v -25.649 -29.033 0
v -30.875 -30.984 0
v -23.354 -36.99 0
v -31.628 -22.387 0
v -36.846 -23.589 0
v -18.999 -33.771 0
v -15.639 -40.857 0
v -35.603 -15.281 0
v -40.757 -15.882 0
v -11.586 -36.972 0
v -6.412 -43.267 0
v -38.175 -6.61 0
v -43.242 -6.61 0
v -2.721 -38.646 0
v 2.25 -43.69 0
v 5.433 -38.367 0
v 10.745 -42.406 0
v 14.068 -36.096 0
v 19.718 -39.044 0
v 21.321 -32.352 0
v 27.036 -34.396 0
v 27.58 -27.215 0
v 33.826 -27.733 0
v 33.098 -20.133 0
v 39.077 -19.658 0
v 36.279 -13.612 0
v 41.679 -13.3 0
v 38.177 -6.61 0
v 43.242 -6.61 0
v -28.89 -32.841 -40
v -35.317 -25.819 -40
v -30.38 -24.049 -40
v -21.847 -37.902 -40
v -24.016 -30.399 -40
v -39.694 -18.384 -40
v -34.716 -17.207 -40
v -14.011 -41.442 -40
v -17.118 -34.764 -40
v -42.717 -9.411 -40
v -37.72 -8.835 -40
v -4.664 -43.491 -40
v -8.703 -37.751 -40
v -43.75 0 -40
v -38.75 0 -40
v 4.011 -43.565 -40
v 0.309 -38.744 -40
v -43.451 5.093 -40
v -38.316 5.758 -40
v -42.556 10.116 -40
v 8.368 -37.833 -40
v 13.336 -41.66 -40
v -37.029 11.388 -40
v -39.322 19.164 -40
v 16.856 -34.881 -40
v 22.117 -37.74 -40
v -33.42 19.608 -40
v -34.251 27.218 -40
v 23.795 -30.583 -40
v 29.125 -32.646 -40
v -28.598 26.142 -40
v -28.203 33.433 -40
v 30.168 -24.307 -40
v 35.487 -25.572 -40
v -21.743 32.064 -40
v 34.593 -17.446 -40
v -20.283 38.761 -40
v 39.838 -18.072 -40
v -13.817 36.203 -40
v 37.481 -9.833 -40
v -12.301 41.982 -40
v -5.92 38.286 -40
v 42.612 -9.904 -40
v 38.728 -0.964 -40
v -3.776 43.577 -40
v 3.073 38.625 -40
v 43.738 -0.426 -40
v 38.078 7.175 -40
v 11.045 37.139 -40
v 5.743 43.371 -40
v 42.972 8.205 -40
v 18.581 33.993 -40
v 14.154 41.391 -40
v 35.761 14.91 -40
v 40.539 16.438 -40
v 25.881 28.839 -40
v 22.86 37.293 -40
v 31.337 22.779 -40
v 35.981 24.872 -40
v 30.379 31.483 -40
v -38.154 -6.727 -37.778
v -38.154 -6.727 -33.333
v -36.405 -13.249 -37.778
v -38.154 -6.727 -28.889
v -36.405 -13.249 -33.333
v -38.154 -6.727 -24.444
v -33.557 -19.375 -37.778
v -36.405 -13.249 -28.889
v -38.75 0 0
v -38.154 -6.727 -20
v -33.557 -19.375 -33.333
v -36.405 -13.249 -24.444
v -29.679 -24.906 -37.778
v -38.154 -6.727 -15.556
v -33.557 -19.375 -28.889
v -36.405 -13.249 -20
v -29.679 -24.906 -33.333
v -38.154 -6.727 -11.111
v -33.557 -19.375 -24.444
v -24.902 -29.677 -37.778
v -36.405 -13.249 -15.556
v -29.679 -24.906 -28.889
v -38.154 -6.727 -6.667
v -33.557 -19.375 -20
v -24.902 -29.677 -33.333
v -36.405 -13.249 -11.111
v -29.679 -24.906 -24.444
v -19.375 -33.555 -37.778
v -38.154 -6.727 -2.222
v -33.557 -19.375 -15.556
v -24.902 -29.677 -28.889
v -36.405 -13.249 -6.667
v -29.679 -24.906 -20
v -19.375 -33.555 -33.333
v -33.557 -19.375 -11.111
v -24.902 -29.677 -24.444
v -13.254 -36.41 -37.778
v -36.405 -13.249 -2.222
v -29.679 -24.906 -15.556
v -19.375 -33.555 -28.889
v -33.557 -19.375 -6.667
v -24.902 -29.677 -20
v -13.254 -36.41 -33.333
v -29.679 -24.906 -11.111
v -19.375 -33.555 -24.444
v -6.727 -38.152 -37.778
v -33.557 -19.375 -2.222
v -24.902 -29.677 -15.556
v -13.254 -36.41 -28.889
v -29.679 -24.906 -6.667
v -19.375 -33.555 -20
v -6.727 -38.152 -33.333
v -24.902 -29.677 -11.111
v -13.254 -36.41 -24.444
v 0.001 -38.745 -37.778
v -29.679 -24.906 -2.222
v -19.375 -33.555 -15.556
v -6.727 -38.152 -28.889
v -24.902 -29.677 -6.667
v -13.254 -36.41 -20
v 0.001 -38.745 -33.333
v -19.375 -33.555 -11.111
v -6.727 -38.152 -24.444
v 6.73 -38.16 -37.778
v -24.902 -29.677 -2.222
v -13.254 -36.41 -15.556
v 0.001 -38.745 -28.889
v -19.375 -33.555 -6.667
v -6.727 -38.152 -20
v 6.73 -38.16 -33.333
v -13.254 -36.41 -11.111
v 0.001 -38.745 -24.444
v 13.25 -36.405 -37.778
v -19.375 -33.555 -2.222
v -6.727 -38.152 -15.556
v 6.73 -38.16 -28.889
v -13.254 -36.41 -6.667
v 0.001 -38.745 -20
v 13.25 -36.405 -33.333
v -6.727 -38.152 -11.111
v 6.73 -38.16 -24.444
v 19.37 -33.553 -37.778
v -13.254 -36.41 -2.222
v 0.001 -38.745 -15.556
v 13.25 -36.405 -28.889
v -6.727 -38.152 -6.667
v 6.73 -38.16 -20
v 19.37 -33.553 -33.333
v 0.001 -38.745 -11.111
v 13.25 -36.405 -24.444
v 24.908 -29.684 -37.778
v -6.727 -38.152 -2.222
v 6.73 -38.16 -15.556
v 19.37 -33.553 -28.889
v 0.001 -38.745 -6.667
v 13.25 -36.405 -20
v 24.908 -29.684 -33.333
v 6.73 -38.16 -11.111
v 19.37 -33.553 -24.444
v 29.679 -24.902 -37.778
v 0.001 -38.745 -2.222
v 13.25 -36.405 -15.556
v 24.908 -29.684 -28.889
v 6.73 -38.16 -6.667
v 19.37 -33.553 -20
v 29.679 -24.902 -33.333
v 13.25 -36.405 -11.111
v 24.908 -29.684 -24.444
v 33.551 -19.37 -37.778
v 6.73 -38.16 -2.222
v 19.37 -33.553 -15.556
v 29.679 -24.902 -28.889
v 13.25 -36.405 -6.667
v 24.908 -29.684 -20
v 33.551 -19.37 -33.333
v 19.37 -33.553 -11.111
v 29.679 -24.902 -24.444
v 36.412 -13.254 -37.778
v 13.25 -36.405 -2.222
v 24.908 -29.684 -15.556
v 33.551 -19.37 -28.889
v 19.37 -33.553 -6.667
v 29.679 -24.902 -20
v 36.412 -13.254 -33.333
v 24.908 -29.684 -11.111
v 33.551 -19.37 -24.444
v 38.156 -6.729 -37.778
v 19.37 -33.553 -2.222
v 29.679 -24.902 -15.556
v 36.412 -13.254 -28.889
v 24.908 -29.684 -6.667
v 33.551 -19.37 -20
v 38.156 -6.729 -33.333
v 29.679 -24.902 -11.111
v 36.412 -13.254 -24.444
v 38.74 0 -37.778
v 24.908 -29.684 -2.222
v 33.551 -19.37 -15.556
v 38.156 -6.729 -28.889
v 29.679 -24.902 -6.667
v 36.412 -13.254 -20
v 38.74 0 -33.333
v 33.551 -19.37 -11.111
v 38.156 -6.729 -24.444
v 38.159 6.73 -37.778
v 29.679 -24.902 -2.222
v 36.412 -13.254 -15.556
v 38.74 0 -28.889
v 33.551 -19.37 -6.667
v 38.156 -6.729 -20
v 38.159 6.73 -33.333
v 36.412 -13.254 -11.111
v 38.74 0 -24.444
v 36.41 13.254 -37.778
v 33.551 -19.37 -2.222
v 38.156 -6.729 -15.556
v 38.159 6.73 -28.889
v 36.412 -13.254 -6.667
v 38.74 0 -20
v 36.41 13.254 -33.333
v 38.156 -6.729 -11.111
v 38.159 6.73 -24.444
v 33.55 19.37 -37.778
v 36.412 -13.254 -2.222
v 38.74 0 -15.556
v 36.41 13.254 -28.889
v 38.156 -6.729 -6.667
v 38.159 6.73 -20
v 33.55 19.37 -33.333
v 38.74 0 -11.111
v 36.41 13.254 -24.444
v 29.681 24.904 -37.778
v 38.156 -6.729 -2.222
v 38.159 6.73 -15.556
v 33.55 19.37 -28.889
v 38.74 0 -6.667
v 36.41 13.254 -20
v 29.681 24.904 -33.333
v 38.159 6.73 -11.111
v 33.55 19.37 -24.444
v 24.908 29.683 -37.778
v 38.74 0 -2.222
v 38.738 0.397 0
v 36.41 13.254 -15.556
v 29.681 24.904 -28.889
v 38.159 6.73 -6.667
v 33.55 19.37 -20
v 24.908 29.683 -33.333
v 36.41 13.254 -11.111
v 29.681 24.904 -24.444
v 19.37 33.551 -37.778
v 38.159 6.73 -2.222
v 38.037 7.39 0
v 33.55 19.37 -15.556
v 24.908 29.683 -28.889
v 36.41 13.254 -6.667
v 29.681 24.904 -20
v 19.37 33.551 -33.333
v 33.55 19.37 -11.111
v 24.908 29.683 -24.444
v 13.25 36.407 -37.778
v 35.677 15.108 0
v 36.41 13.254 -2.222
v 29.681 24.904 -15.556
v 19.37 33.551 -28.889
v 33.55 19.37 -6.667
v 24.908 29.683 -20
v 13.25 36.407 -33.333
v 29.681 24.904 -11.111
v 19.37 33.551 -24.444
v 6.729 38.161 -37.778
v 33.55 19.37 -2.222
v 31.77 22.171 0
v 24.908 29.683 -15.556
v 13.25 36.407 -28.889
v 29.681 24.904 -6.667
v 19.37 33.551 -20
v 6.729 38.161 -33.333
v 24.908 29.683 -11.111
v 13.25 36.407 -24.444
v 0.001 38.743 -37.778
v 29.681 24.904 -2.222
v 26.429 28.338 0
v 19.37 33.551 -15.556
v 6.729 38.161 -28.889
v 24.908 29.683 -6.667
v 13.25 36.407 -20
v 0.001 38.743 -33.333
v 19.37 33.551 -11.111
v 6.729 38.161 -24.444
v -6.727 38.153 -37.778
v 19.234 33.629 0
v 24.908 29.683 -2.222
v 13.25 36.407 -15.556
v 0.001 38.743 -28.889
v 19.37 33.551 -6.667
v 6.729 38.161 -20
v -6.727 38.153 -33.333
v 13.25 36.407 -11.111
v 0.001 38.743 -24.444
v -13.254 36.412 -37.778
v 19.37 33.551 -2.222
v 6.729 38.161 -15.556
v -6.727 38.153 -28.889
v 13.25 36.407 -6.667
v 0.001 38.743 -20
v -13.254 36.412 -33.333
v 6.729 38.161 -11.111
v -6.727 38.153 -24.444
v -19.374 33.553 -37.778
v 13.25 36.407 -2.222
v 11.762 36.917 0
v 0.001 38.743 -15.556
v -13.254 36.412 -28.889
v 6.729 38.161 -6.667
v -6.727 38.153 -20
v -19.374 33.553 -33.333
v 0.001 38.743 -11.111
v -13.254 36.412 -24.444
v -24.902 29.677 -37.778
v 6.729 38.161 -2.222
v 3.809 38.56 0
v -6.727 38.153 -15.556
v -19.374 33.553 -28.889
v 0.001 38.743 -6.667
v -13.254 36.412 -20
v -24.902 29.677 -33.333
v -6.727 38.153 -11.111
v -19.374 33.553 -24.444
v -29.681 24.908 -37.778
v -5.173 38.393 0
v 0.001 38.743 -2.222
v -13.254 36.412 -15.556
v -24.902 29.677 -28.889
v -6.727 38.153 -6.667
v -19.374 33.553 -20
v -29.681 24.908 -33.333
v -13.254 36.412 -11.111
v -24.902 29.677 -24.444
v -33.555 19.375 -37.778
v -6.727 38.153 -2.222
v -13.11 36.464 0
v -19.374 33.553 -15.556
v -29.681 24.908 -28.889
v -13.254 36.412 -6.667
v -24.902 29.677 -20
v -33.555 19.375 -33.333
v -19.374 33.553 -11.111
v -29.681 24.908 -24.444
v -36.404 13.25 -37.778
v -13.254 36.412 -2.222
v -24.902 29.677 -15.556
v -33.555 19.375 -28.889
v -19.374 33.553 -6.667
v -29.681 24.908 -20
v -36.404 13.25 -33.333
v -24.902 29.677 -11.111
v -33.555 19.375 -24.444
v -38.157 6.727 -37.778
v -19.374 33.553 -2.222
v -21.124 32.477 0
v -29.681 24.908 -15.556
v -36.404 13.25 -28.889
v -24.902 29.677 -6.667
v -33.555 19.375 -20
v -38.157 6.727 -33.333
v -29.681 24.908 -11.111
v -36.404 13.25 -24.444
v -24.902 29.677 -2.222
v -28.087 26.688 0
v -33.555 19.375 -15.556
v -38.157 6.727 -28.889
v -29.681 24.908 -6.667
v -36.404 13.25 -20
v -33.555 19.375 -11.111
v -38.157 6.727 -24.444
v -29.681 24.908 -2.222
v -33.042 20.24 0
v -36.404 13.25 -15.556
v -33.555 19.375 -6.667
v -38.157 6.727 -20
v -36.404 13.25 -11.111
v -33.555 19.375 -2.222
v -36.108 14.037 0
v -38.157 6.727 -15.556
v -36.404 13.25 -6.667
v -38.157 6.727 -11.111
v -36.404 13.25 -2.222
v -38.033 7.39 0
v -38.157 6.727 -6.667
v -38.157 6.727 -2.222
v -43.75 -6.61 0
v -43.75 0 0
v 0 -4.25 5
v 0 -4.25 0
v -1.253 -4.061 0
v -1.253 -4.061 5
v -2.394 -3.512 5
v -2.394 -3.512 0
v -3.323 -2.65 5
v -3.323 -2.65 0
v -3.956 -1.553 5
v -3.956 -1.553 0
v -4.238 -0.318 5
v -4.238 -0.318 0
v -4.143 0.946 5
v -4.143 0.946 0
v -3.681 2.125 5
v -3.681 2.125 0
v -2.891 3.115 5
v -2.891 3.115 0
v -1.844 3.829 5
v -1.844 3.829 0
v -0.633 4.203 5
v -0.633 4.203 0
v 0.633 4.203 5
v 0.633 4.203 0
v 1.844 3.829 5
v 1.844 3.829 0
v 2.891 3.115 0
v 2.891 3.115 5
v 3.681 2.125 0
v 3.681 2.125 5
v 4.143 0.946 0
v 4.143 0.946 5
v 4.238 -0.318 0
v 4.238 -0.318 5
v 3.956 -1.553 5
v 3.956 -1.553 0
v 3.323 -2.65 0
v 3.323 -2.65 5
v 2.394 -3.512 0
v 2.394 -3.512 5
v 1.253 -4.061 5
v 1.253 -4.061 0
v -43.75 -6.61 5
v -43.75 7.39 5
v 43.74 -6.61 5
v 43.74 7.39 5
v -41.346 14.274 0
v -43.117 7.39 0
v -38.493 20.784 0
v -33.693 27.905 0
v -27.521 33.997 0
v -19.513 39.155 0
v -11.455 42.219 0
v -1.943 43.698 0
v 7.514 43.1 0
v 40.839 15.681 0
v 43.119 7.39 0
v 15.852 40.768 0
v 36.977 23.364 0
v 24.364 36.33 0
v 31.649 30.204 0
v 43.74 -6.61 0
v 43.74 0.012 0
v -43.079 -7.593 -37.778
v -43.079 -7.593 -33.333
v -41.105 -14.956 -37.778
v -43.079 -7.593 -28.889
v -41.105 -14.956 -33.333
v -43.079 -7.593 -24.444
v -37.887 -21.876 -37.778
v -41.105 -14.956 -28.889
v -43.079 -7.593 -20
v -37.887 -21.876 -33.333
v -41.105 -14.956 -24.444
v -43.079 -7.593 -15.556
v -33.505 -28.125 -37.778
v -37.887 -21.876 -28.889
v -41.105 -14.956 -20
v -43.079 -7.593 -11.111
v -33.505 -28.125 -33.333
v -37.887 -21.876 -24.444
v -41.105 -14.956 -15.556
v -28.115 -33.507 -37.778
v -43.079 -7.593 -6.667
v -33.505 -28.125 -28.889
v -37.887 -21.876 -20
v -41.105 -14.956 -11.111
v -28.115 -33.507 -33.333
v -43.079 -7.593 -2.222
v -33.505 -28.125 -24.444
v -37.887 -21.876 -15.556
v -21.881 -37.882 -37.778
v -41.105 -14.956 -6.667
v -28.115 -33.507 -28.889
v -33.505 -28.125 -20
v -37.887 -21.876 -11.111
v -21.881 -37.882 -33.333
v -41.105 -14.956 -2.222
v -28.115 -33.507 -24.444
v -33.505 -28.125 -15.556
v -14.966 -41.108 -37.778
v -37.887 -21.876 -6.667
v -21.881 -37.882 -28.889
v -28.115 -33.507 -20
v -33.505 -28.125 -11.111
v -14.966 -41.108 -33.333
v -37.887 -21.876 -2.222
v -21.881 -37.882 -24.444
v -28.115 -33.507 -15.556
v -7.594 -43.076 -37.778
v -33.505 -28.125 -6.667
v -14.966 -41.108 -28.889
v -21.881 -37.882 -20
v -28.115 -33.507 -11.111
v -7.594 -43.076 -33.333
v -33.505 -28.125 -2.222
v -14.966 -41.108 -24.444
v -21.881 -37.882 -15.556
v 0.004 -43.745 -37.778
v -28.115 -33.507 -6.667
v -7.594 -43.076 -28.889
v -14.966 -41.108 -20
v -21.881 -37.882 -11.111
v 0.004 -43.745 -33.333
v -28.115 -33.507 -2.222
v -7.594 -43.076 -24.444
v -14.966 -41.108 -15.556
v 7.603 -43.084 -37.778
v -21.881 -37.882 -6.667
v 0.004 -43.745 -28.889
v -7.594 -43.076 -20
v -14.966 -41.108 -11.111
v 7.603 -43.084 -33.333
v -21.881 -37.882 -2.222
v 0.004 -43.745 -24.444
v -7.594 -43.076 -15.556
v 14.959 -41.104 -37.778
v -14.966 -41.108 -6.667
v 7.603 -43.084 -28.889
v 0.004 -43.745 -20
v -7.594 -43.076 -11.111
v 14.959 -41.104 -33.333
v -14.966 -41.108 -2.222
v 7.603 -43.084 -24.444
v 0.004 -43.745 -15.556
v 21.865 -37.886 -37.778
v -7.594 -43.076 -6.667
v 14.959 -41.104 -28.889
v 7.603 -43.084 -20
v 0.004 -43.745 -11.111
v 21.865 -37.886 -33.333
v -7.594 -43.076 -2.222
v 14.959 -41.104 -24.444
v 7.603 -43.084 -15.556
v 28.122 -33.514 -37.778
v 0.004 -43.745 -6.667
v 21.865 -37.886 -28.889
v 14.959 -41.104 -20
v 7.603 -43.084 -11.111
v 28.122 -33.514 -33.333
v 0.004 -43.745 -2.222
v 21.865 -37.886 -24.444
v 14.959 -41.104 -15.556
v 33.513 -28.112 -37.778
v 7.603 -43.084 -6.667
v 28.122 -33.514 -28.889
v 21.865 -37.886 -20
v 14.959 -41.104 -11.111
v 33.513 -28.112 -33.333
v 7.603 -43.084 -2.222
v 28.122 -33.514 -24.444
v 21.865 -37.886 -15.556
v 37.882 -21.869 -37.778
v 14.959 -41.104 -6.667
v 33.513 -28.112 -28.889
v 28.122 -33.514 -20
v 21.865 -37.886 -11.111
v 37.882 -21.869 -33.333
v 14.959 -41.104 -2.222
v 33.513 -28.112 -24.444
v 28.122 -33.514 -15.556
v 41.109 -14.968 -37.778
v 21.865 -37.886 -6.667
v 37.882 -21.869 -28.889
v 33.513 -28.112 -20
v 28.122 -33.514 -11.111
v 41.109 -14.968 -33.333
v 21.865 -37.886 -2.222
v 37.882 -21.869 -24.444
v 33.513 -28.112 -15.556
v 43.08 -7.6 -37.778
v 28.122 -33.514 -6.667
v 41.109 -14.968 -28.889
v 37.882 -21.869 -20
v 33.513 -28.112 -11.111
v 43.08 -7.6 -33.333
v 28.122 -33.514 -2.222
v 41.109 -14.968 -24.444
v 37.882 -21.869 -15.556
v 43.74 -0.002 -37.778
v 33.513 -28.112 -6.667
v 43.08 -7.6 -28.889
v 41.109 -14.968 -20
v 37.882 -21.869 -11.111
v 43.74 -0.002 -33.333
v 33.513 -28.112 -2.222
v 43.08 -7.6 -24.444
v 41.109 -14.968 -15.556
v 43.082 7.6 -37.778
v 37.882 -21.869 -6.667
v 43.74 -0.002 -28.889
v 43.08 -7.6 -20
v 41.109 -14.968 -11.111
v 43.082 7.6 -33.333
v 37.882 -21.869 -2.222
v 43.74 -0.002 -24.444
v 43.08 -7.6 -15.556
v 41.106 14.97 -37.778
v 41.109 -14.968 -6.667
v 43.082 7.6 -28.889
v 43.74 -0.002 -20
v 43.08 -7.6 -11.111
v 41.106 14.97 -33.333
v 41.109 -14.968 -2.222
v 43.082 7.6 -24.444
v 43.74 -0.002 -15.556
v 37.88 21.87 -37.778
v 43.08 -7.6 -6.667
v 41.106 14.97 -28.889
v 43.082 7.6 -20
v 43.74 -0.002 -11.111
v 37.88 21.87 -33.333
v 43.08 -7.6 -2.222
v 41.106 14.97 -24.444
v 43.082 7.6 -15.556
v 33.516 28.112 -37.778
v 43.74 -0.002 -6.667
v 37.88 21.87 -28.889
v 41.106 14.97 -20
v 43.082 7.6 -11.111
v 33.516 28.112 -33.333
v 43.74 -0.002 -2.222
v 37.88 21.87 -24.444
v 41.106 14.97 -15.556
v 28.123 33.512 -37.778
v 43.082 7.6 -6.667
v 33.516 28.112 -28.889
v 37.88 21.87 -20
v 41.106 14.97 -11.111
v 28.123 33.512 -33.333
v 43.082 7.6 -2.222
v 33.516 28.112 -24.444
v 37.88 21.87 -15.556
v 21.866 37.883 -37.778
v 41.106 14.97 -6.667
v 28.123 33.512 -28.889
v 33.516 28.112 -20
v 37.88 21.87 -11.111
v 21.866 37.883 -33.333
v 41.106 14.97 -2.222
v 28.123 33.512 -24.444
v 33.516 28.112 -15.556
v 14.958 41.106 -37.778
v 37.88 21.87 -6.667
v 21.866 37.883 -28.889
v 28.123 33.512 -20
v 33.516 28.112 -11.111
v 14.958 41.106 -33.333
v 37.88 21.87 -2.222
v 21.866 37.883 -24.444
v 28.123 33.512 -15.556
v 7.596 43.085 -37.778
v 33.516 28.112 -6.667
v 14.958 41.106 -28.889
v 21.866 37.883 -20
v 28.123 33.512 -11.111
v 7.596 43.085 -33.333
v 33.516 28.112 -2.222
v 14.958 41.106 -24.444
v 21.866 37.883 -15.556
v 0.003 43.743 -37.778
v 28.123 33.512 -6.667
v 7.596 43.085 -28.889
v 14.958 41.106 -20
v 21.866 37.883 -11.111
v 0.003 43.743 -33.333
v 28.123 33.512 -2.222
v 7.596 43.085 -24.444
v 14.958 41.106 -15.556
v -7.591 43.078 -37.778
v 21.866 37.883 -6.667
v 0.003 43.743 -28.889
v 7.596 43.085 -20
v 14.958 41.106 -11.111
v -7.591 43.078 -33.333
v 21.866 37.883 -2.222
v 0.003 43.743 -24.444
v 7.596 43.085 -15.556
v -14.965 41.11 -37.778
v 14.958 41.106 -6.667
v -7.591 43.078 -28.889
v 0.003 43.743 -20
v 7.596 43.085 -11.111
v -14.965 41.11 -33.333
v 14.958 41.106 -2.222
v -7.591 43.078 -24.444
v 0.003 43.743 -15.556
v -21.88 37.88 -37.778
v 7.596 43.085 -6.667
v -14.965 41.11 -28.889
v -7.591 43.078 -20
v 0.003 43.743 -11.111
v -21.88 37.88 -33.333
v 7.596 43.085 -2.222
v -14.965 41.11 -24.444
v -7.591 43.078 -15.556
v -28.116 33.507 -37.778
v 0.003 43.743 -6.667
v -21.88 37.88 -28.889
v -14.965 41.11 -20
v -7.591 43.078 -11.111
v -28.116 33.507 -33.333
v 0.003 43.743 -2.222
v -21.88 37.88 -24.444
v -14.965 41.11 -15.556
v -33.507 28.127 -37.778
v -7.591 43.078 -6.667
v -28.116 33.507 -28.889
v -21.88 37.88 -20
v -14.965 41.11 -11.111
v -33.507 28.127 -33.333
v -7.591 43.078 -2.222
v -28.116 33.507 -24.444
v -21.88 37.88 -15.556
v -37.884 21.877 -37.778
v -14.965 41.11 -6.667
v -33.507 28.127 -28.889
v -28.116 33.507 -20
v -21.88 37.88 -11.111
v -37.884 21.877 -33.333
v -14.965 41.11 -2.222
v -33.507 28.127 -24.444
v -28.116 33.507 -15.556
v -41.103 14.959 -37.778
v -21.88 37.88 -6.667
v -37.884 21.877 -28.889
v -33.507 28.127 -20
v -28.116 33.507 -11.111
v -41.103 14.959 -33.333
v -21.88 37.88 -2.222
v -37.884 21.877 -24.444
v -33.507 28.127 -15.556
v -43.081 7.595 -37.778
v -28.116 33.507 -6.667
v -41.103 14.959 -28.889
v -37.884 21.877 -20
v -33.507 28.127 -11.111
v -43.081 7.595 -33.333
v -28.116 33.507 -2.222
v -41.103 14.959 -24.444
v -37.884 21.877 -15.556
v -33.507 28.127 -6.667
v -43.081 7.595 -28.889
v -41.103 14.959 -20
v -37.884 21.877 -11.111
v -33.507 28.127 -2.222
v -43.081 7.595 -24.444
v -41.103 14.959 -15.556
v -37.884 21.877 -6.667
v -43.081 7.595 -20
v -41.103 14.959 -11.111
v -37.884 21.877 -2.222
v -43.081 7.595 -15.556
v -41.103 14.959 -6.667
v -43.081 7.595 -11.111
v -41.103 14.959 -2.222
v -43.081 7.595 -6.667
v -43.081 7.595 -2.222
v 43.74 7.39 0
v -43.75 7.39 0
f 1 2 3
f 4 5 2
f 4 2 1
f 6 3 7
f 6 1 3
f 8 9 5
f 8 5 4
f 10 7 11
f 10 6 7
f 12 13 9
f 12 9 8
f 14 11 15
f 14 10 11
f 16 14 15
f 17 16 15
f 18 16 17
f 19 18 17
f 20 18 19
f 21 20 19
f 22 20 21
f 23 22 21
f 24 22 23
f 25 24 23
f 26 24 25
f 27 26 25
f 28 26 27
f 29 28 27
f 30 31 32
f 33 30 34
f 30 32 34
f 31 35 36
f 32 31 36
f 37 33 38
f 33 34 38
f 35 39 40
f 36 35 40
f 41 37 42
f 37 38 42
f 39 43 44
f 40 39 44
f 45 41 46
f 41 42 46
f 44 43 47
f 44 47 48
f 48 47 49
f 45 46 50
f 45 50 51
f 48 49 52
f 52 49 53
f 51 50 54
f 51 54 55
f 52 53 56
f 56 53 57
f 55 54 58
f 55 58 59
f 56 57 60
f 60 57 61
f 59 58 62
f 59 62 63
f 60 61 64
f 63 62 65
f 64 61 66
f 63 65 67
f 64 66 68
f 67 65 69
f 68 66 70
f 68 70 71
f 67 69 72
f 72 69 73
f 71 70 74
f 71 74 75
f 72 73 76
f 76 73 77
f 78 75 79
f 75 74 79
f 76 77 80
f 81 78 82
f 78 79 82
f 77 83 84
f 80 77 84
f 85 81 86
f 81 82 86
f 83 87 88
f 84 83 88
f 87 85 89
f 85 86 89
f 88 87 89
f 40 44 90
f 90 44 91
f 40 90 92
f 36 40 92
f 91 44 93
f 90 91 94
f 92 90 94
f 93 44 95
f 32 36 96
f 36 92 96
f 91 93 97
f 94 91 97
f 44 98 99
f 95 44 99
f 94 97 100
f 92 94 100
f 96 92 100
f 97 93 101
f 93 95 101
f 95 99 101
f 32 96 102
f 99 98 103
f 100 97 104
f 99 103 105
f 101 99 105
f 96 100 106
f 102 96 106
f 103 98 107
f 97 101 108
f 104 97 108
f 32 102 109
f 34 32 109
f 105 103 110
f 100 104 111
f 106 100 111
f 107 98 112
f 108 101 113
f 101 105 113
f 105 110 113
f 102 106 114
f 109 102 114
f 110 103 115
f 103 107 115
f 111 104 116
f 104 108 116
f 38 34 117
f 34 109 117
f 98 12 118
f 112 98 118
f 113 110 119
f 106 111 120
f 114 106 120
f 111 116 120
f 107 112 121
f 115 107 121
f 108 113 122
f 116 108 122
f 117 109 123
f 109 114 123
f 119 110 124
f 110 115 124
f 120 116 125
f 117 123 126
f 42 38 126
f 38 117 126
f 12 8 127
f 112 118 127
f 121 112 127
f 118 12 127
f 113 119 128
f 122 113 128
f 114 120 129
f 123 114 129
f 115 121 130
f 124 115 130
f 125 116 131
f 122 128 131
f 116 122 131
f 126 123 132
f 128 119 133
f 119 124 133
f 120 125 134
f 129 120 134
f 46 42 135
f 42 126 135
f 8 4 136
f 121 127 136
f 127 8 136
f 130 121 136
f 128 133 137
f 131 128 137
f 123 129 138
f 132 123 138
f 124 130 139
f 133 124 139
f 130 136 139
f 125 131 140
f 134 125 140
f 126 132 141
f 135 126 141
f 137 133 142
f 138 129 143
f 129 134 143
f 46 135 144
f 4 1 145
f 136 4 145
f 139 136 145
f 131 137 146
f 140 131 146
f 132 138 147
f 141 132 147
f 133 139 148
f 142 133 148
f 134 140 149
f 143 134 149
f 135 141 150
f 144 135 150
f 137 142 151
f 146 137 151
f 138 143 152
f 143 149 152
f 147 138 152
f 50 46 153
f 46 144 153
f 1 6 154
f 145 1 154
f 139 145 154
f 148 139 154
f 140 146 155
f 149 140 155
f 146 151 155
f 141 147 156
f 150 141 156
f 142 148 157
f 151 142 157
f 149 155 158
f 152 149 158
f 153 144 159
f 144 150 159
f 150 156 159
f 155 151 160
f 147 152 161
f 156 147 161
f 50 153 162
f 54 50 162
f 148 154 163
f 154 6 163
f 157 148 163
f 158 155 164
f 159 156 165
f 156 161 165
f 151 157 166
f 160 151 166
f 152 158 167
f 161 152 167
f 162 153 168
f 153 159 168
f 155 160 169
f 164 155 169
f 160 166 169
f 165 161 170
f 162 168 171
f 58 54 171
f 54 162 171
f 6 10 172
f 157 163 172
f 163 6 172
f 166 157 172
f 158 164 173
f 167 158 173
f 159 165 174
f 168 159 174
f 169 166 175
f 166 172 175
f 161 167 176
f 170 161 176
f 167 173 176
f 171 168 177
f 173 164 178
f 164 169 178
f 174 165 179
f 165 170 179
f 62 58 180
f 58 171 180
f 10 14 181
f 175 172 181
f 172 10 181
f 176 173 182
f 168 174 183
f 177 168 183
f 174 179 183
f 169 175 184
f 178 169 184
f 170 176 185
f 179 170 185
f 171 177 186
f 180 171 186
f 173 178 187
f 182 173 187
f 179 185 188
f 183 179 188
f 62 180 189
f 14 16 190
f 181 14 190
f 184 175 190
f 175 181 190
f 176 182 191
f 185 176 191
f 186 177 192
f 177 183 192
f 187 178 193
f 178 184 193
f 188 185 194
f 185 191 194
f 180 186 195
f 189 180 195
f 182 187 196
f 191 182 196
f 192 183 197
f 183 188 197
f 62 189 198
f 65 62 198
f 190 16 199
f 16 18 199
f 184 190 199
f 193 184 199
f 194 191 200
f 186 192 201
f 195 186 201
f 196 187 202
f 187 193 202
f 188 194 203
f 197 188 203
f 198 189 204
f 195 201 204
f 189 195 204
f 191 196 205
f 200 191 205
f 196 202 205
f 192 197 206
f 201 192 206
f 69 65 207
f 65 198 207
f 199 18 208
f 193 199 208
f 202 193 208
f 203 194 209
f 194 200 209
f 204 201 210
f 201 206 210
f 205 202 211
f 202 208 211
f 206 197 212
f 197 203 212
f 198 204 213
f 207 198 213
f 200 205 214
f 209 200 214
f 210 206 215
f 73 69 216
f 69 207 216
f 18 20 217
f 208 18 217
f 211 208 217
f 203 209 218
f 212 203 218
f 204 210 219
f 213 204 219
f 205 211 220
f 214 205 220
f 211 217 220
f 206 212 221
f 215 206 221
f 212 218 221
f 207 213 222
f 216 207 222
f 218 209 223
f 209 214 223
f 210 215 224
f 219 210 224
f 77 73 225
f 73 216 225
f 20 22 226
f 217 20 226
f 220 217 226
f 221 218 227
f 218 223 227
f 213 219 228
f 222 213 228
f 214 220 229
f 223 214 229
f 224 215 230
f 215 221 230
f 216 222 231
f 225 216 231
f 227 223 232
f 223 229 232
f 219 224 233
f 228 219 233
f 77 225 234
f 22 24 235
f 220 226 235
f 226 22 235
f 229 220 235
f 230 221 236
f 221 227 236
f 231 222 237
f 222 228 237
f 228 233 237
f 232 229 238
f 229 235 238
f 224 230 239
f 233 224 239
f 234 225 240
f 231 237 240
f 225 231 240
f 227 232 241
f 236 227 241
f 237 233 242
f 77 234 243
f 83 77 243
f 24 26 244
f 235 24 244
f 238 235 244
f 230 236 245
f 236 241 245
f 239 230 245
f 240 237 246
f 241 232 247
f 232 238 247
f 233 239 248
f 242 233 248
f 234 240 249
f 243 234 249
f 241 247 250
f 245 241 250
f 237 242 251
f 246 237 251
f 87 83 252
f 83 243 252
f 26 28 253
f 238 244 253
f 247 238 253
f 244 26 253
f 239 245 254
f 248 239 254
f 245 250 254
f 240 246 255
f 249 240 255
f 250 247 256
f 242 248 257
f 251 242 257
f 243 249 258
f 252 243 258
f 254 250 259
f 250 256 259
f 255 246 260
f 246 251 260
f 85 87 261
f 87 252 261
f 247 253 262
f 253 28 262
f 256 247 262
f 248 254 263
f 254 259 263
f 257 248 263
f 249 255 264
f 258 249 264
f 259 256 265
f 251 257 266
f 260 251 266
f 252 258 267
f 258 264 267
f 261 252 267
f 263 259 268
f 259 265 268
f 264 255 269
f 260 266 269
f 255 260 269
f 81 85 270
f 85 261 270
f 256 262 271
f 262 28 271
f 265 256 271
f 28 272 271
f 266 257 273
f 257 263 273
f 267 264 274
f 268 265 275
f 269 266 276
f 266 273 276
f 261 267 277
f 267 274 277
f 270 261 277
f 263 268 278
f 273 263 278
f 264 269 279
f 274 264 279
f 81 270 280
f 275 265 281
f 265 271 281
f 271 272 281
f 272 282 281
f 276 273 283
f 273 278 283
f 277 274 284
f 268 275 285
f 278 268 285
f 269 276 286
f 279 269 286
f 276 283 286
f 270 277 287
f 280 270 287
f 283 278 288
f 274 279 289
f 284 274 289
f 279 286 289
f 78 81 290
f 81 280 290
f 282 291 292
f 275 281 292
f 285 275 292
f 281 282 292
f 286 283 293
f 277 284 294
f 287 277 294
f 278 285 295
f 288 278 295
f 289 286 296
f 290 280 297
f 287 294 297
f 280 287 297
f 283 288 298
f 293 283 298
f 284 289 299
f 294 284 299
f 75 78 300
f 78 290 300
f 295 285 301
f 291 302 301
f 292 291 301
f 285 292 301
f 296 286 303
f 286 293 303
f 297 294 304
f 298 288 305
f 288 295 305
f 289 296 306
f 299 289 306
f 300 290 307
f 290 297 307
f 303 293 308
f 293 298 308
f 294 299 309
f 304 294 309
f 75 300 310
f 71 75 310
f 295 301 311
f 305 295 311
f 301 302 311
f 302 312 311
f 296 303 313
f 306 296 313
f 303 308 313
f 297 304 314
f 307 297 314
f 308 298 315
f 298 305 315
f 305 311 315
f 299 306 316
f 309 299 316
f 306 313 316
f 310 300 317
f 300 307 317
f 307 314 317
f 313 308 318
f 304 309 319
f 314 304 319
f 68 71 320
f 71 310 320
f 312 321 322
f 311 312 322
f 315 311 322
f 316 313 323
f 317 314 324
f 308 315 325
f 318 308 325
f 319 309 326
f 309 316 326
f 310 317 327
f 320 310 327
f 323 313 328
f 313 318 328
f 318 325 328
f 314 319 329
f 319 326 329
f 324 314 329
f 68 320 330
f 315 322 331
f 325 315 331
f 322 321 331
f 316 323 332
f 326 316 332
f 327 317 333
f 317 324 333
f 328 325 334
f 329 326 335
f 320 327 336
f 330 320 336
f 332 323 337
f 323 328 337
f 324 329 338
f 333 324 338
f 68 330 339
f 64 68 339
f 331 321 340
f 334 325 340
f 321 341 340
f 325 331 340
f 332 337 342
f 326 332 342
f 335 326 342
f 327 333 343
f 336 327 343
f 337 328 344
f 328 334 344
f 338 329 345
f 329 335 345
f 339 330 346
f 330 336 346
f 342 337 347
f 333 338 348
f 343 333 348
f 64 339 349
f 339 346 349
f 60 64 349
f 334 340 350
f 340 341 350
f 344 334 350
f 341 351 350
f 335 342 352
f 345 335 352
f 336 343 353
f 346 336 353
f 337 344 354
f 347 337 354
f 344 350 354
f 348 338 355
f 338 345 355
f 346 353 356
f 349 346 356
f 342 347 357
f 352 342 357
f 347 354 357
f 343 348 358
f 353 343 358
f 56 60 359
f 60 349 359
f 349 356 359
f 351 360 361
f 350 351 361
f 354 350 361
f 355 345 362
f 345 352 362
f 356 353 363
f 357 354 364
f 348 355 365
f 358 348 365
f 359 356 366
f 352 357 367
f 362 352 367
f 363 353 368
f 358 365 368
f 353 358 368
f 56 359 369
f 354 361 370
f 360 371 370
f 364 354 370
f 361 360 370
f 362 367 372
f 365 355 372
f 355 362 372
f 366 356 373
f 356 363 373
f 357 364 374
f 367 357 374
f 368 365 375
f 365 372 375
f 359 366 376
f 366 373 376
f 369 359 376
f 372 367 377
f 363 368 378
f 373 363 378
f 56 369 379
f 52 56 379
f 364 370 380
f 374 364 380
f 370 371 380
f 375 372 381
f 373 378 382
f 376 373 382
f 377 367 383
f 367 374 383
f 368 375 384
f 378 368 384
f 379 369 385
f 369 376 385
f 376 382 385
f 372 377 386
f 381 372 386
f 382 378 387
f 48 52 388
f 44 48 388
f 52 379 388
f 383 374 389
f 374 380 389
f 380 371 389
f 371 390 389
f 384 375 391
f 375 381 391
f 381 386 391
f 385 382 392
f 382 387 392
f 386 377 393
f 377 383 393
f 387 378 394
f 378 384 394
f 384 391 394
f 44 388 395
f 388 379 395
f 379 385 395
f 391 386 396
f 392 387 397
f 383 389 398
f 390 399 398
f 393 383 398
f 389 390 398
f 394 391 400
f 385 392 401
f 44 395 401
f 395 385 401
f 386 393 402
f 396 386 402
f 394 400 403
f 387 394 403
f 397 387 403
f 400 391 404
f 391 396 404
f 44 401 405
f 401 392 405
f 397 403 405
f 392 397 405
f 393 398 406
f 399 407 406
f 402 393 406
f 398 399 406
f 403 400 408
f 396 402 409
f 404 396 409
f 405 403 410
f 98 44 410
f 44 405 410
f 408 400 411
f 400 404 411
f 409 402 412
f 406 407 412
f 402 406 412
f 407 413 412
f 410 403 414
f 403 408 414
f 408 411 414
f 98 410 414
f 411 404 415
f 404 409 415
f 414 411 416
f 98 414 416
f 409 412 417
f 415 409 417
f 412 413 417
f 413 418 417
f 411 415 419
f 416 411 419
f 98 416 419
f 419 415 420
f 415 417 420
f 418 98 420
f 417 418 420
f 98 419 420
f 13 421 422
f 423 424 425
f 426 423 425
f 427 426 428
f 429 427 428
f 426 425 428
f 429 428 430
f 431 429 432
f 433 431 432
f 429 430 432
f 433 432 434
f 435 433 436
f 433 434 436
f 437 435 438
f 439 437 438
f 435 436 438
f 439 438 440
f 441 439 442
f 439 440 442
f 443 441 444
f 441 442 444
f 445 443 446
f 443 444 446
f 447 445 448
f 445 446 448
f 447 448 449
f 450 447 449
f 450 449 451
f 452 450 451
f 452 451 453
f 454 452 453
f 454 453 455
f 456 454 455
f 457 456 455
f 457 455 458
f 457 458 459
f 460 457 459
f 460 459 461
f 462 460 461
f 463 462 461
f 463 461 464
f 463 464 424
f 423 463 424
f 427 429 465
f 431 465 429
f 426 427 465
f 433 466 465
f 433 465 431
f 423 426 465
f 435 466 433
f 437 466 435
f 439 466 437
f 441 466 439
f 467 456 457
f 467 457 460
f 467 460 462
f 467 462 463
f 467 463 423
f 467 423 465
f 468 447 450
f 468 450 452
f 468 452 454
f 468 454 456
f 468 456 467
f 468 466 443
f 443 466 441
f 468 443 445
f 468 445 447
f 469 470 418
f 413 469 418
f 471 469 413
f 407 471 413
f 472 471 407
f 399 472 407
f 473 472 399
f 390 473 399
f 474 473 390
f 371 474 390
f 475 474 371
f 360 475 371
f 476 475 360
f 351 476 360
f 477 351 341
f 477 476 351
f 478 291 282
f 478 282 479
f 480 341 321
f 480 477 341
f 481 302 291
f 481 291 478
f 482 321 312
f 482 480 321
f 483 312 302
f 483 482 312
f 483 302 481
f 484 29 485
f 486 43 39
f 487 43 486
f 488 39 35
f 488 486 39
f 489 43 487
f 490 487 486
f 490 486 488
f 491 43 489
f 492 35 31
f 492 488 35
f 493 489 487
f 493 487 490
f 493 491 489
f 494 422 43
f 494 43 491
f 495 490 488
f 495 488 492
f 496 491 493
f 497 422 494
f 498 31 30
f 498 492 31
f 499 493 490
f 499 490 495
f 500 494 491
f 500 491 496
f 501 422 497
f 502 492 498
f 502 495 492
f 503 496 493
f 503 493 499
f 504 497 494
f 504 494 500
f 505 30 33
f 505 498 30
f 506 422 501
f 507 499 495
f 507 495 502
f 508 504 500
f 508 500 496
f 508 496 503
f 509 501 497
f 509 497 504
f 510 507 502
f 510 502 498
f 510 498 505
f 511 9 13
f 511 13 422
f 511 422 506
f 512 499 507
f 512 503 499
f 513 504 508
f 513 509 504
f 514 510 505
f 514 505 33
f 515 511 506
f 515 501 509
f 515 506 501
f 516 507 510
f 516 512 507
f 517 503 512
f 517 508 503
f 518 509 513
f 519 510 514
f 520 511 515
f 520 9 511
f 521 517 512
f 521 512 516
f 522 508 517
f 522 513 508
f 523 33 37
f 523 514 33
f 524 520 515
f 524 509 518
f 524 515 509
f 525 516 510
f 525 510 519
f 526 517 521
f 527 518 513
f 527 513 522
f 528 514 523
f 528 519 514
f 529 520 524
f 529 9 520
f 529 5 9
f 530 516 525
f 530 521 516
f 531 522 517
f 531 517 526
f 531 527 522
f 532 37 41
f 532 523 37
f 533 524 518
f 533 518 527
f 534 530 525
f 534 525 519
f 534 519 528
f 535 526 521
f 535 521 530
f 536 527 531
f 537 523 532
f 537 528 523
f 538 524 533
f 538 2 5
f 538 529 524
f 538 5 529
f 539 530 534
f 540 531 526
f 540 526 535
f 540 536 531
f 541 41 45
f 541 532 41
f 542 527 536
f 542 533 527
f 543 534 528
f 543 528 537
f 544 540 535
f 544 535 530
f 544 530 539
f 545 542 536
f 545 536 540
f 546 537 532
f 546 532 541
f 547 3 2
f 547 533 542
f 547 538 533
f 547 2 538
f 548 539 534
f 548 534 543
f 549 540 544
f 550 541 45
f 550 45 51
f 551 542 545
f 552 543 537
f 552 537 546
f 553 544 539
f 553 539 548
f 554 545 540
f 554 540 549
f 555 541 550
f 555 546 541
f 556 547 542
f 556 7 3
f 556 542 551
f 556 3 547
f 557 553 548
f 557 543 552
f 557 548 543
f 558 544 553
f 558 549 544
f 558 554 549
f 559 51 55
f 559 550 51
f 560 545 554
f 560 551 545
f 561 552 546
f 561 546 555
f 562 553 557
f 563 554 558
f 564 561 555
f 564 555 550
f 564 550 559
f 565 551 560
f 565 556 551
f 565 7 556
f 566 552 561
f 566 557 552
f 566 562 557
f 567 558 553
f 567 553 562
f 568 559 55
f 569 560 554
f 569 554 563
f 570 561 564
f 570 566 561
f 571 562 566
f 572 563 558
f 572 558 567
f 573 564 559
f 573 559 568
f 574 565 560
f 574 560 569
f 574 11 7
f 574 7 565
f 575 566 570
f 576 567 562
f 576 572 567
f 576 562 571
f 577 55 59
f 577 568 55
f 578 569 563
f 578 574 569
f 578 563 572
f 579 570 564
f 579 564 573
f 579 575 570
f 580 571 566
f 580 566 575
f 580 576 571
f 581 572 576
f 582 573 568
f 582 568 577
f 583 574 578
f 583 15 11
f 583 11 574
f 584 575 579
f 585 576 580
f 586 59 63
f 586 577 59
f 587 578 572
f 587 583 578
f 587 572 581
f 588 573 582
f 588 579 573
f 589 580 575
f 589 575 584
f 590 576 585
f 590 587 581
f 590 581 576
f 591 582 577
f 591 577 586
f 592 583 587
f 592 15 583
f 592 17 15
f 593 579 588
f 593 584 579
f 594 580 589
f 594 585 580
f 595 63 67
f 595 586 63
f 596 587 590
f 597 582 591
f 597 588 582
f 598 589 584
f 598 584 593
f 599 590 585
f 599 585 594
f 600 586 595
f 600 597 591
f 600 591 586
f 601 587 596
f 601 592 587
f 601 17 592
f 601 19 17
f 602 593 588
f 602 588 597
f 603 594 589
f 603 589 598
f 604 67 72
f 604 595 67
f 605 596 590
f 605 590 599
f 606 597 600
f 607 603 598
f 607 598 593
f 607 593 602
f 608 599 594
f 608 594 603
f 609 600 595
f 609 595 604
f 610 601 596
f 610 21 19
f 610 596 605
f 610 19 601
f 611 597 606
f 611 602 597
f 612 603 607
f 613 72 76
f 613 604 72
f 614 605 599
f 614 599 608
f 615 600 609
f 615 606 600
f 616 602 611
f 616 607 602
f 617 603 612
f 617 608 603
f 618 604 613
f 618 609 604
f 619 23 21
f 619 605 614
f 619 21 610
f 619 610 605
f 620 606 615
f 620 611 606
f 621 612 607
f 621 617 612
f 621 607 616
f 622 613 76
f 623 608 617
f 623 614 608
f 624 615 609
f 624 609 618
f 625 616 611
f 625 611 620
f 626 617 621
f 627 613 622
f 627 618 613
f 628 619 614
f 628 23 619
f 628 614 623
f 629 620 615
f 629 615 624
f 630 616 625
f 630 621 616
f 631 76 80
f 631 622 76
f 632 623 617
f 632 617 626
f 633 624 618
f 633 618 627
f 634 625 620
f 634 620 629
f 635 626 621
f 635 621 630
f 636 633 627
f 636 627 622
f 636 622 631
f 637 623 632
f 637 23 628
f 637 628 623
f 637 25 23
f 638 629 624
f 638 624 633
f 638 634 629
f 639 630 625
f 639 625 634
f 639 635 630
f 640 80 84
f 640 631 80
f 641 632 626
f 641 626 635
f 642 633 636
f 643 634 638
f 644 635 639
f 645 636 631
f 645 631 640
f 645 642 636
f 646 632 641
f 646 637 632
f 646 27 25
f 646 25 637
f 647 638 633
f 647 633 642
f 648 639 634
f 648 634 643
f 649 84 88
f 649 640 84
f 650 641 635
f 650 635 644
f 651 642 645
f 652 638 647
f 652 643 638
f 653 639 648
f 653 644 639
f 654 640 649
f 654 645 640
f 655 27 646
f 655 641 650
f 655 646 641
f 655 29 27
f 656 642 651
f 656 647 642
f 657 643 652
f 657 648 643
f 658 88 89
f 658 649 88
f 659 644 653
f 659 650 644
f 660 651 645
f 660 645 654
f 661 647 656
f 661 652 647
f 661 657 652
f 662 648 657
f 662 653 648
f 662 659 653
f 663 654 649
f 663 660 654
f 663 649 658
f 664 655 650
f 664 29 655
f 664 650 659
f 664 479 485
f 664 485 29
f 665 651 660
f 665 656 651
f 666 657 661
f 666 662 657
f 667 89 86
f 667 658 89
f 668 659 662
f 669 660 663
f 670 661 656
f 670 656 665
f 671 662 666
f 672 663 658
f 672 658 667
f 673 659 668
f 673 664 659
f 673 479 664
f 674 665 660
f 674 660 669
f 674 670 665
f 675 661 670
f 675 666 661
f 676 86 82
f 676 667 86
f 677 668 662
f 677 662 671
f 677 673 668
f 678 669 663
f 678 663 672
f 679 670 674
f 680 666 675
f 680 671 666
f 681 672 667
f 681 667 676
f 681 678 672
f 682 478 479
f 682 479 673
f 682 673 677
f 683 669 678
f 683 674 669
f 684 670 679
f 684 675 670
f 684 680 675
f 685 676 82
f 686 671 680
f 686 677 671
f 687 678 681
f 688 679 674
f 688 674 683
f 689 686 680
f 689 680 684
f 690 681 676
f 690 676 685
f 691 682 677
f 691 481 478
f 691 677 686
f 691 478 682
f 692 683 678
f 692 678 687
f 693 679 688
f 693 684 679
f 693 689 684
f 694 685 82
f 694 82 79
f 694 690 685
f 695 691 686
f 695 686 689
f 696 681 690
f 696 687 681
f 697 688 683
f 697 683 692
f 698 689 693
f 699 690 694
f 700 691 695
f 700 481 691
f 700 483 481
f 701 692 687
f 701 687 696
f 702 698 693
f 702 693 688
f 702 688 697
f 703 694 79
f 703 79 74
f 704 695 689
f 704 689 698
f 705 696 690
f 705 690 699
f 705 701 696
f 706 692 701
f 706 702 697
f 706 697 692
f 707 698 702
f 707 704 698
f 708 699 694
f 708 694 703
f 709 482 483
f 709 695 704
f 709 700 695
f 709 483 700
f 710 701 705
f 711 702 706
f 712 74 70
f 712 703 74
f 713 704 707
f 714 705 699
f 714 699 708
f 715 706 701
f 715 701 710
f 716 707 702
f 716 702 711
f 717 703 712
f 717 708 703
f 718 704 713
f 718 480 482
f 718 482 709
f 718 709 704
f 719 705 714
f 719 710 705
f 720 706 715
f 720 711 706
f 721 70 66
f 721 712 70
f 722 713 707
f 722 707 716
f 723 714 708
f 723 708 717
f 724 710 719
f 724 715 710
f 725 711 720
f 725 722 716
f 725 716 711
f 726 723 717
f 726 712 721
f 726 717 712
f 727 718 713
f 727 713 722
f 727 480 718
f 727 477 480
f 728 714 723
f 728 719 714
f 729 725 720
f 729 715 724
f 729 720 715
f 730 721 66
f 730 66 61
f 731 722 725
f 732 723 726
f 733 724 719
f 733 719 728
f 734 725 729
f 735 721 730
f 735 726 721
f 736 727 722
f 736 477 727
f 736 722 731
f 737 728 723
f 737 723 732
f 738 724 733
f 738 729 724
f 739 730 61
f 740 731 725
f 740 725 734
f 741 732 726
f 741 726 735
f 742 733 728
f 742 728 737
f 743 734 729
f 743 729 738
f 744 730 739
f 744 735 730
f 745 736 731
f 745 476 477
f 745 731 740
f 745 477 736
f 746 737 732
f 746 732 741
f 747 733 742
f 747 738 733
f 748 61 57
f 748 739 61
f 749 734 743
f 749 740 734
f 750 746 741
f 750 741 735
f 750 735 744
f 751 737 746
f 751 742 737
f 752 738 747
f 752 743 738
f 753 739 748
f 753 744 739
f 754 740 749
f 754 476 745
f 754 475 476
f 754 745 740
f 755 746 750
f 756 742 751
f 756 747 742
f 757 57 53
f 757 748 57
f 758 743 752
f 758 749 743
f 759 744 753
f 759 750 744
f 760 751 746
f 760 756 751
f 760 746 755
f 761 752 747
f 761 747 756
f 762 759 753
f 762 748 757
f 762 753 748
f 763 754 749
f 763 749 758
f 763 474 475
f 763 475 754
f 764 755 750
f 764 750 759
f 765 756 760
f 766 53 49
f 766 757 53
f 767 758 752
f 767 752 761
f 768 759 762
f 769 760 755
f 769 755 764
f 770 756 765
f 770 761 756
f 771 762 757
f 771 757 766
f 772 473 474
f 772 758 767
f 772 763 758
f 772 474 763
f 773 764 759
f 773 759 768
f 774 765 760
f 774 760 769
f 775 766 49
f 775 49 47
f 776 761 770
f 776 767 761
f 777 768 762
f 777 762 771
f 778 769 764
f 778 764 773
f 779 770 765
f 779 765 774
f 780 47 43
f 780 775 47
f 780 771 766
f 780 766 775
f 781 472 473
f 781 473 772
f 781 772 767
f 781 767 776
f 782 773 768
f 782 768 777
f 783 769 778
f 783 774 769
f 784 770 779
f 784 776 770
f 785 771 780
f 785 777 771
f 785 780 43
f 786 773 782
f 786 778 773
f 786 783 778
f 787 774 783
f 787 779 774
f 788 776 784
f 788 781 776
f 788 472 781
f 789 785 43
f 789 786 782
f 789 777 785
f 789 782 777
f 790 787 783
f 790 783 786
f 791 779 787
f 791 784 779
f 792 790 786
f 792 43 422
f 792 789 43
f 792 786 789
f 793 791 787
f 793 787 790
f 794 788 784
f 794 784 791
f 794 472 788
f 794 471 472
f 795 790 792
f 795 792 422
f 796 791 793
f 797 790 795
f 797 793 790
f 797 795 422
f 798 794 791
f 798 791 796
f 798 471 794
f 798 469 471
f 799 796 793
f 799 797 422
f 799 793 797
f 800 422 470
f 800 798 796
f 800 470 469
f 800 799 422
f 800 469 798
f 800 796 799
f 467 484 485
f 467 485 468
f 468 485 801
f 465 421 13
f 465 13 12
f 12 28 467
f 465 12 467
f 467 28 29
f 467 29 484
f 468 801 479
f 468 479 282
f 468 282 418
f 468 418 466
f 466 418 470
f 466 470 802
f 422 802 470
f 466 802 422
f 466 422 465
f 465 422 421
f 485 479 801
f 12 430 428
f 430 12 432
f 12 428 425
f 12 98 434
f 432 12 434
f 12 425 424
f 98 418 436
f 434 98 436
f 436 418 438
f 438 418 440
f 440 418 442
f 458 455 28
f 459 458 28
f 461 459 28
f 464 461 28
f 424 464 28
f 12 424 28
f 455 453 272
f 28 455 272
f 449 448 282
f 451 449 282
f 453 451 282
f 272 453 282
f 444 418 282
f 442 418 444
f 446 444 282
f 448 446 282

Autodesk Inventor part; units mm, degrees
ref_plane "YZ Plane" through (0, 0, 0) normal (1, 0, 0) x (0, 1, 0)
ref_plane "XZ Plane" through (0, 0, 0) normal (0, 1, 0) x (-1, 0, 0)
ref_plane "XY Plane" through (0, 0, 0) normal (0, 0, 1) x (1, 0, 0)
sketch "Sketch1" plane through (0, 0, 0) normal (0, 0, 1) x (1, 0, 0)
  spline S0 degree 3 poles (-37.25, 0) (-37.25, -7.0376) (-35.2039, -14.0633) (-31.4252, -20.0004) (-27.6466, -25.9375) (-22.1482, -30.766) (-15.7726, -33.7459) (-9.397, -36.7258) (-2.1659, -37.8471) (4.8127, -36.9378) (11.7914, -36.0285) (18.4938, -33.0918) (23.893, -28.5778) (29.2921, -24.0637) (33.3697, -17.9875) (35.5009, -11.2804) (37.6321, -4.5732) (37.8097, 2.7422) (36.0064, 9.5448) (34.2031, 16.3475) (30.4251, 22.6143) (25.2512, 27.385) (20.0774, 32.1557) (13.5254, 35.414) (6.5991, 36.6608) (-0.3272, 37.9076) (-7.6042, 37.1385) (-14.1169, 34.4714) (-20.6295, 31.8043) (-26.3557, 27.2483) (-30.4179, 21.5014) (-34.4802, 15.7546) (-36.8647, 8.8365) (-37.2061, 1.8072) (-37.2354, 1.2052) (-37.25, 0.6026) (-37.25, 0) knots 0 0 0 0 0.566787 0.566787 0.566787 1.133573 1.133573 1.133573 1.70036 1.70036 1.70036 2.267146 2.267146 2.267146 2.833933 2.833933 2.833933 3.400719 3.400719 3.400719 3.967506 3.967506 3.967506 4.534292 4.534292 4.534292 5.101079 5.101079 5.101079 5.667865 5.667865 5.667865 6.234652 6.234652 6.234652 6.283185 6.283185 6.283185 6.283185 projected
  spline S1 degree 5 poles (-38.75, 0) (-38.7501, -2.7047) (-38.5078, -5.4094) (-38.0316, -8.0852) (-36.6239, -13.33) (-34.3392, -18.2559) (-32.9845, -20.6148) (-29.8595, -25.0561) (-26.0175, -28.8925) (-23.9357, -30.6396) (-19.4934, -33.7614) (-14.5735, -36.0618) (-12.0149, -36.9831) (-6.7678, -38.3822) (-1.3581, -38.8593) (1.3604, -38.8675) (6.7714, -38.3973) (12.0133, -36.9798) (14.5666, -36.049) (19.4877, -33.7543) (23.9437, -30.6512) (26.0275, -28.9023) (29.8573, -25.0529) (32.972, -20.6052) (34.3321, -18.2523) (36.6385, -13.3362) (38.0403, -8.0889) (38.5046, -5.4103) (38.9743, 0) (38.5079, 5.4103) (38.0448, 8.0901) (36.6331, 13.3345) (34.3305, 18.2516) (32.9714, 20.6051) (29.8608, 25.0551) (26.0293, 28.9037) (23.9413, 30.647) (19.4872, 33.7528) (14.5665, 36.0499) (12.0141, 36.984) (6.7708, 38.3997) (1.3596, 38.8619) (-1.3583, 38.8577) (-6.7678, 38.3823) (-12.0157, 36.988) (-14.5739, 36.063) (-19.4902, 33.7565) (-23.9357, 30.6394) (-26.0178, 28.8927) (-29.8639, 25.0602) (-32.9831, 20.614) (-34.3346, 18.2543) (-36.6237, 13.3303) (-38.0331, 8.0858) (-38.5138, 5.4104) (-38.7506, 2.7047) (-38.75, 0) knots 0 0 0 0 0 0 0.055551 0.055551 0.055551 0.111119 0.111119 0.111119 0.166658 0.166658 0.166658 0.222223 0.222223 0.222223 0.277783 0.277783 0.277783 0.333326 0.333326 0.333326 0.388895 0.388895 0.388895 0.444438 0.444438 0.444438 0.499998 0.499998 0.499998 0.555563 0.555563 0.555563 0.611102 0.611102 0.611102 0.66667 0.66667 0.66667 0.722222 0.722222 0.722222 0.777772 0.777772 0.777772 0.83334 0.83334 0.83334 0.88888 0.88888 0.88888 0.944445 0.944445 0.944445 1 1 1 1 1 1
  spline S2 degree 5 poles (-43.75, 0) (-43.7501, -3.0529) (-43.4775, -6.1058) (-42.9407, -9.1264) (-41.3515, -15.0495) (-38.7703, -20.6121) (-37.2389, -23.2767) (-33.7116, -28.2913) (-29.3743, -32.6225) (-27.0258, -34.5933) (-22.0107, -38.1167) (-16.4569, -40.7135) (-13.5672, -41.7555) (-7.641, -43.3364) (-1.5309, -43.8747) (1.5391, -43.8827) (7.6467, -43.3509) (13.5639, -41.7524) (16.4449, -40.7023) (22.0015, -38.1117) (27.0322, -34.6069) (29.3867, -32.6308) (33.7119, -28.2852) (37.2284, -23.263) (38.763, -20.6081) (41.3648, -15.0583) (42.9484, -9.1357) (43.4738, -6.1111) (44.0049, -0.0005) (43.4774, 6.1102) (42.9529, 9.1371) (41.3593, 15.0572) (38.7607, 20.6082) (37.2277, 23.2632) (33.7158, 28.2869) (29.3897, 32.6312) (27.0312, 34.6016) (22.0016, 38.1099) (16.4443, 40.7036) (13.5628, 41.7573) (7.6441, 43.3536) (1.5365, 43.877) (-1.5313, 43.873) (-7.6403, 43.3367) (-13.5665, 41.7609) (-16.4565, 40.7151) (-22.0073, 38.1119) (-27.0262, 34.5928) (-29.3749, 32.6223) (-33.7159, 28.2954) (-37.237, 23.2766) (-38.7649, 20.6118) (-41.3507, 15.0514) (-42.9418, 9.1288) (-43.4834, 6.1081) (-43.7506, 3.0536) (-43.75, 0) knots 0 0 0 0 0 0 0.055537 0.055537 0.055537 0.111144 0.111144 0.111144 0.166635 0.166635 0.166635 0.222228 0.222228 0.222228 0.277799 0.277799 0.277799 0.333305 0.333305 0.333305 0.388916 0.388916 0.388916 0.444424 0.444424 0.444424 0.499992 0.499992 0.499992 0.555587 0.555587 0.555587 0.611077 0.611077 0.611077 0.666684 0.666684 0.666684 0.722224 0.722224 0.722224 0.777757 0.777757 0.777757 0.833365 0.833365 0.833365 0.888857 0.888857 0.888857 0.944449 0.944449 0.944449 1 1 1 1 1 1
  point P0 (0, 0)
  point P1 (-37.25, 0)
  dimension "d0" = 1.5
  dimension "d1" = 6.5
extrude "Extrusion1" add sketch "Sketch1" against normal blind 40 contours S2
sketch "Sketch5" plane through (0, 0, 0) normal (0, 0, 1) x (1, 0, 0)
  line L0 (-43.75, -6.6095) -> (43.7402, -6.6095)
  line L1 (43.7402, -6.6095) -> (43.7402, 7.3905)
  line L2 (43.7402, 7.3905) -> (-43.75, 7.3905)
  line L3 (-43.75, 7.3905) -> (-43.75, -6.6095)
  line L4 (-43.75, -6.6095) -> (43.7402, 7.3905) construction
  line L5 (43.7402, -6.6095) -> (-43.75, 7.3905) construction
  point P0 (-38.75, 0)
  point P1 (-0.0049, 0.3905)
  dimension "d27" = 14
extrude "Extrusion5" add sketch "Sketch5" along normal blind 5
sketch "Sketch6" plane through (0, 0, 5) normal (0, 0, 1) x (1, 0, 0)
  point P0 (0, 0)
  point P1 (0, 0)
hole "Hole1" at (0, 0, 5) direction (0, 0, -1) diameter 8.5 end through all
properties part number "tunnel"
